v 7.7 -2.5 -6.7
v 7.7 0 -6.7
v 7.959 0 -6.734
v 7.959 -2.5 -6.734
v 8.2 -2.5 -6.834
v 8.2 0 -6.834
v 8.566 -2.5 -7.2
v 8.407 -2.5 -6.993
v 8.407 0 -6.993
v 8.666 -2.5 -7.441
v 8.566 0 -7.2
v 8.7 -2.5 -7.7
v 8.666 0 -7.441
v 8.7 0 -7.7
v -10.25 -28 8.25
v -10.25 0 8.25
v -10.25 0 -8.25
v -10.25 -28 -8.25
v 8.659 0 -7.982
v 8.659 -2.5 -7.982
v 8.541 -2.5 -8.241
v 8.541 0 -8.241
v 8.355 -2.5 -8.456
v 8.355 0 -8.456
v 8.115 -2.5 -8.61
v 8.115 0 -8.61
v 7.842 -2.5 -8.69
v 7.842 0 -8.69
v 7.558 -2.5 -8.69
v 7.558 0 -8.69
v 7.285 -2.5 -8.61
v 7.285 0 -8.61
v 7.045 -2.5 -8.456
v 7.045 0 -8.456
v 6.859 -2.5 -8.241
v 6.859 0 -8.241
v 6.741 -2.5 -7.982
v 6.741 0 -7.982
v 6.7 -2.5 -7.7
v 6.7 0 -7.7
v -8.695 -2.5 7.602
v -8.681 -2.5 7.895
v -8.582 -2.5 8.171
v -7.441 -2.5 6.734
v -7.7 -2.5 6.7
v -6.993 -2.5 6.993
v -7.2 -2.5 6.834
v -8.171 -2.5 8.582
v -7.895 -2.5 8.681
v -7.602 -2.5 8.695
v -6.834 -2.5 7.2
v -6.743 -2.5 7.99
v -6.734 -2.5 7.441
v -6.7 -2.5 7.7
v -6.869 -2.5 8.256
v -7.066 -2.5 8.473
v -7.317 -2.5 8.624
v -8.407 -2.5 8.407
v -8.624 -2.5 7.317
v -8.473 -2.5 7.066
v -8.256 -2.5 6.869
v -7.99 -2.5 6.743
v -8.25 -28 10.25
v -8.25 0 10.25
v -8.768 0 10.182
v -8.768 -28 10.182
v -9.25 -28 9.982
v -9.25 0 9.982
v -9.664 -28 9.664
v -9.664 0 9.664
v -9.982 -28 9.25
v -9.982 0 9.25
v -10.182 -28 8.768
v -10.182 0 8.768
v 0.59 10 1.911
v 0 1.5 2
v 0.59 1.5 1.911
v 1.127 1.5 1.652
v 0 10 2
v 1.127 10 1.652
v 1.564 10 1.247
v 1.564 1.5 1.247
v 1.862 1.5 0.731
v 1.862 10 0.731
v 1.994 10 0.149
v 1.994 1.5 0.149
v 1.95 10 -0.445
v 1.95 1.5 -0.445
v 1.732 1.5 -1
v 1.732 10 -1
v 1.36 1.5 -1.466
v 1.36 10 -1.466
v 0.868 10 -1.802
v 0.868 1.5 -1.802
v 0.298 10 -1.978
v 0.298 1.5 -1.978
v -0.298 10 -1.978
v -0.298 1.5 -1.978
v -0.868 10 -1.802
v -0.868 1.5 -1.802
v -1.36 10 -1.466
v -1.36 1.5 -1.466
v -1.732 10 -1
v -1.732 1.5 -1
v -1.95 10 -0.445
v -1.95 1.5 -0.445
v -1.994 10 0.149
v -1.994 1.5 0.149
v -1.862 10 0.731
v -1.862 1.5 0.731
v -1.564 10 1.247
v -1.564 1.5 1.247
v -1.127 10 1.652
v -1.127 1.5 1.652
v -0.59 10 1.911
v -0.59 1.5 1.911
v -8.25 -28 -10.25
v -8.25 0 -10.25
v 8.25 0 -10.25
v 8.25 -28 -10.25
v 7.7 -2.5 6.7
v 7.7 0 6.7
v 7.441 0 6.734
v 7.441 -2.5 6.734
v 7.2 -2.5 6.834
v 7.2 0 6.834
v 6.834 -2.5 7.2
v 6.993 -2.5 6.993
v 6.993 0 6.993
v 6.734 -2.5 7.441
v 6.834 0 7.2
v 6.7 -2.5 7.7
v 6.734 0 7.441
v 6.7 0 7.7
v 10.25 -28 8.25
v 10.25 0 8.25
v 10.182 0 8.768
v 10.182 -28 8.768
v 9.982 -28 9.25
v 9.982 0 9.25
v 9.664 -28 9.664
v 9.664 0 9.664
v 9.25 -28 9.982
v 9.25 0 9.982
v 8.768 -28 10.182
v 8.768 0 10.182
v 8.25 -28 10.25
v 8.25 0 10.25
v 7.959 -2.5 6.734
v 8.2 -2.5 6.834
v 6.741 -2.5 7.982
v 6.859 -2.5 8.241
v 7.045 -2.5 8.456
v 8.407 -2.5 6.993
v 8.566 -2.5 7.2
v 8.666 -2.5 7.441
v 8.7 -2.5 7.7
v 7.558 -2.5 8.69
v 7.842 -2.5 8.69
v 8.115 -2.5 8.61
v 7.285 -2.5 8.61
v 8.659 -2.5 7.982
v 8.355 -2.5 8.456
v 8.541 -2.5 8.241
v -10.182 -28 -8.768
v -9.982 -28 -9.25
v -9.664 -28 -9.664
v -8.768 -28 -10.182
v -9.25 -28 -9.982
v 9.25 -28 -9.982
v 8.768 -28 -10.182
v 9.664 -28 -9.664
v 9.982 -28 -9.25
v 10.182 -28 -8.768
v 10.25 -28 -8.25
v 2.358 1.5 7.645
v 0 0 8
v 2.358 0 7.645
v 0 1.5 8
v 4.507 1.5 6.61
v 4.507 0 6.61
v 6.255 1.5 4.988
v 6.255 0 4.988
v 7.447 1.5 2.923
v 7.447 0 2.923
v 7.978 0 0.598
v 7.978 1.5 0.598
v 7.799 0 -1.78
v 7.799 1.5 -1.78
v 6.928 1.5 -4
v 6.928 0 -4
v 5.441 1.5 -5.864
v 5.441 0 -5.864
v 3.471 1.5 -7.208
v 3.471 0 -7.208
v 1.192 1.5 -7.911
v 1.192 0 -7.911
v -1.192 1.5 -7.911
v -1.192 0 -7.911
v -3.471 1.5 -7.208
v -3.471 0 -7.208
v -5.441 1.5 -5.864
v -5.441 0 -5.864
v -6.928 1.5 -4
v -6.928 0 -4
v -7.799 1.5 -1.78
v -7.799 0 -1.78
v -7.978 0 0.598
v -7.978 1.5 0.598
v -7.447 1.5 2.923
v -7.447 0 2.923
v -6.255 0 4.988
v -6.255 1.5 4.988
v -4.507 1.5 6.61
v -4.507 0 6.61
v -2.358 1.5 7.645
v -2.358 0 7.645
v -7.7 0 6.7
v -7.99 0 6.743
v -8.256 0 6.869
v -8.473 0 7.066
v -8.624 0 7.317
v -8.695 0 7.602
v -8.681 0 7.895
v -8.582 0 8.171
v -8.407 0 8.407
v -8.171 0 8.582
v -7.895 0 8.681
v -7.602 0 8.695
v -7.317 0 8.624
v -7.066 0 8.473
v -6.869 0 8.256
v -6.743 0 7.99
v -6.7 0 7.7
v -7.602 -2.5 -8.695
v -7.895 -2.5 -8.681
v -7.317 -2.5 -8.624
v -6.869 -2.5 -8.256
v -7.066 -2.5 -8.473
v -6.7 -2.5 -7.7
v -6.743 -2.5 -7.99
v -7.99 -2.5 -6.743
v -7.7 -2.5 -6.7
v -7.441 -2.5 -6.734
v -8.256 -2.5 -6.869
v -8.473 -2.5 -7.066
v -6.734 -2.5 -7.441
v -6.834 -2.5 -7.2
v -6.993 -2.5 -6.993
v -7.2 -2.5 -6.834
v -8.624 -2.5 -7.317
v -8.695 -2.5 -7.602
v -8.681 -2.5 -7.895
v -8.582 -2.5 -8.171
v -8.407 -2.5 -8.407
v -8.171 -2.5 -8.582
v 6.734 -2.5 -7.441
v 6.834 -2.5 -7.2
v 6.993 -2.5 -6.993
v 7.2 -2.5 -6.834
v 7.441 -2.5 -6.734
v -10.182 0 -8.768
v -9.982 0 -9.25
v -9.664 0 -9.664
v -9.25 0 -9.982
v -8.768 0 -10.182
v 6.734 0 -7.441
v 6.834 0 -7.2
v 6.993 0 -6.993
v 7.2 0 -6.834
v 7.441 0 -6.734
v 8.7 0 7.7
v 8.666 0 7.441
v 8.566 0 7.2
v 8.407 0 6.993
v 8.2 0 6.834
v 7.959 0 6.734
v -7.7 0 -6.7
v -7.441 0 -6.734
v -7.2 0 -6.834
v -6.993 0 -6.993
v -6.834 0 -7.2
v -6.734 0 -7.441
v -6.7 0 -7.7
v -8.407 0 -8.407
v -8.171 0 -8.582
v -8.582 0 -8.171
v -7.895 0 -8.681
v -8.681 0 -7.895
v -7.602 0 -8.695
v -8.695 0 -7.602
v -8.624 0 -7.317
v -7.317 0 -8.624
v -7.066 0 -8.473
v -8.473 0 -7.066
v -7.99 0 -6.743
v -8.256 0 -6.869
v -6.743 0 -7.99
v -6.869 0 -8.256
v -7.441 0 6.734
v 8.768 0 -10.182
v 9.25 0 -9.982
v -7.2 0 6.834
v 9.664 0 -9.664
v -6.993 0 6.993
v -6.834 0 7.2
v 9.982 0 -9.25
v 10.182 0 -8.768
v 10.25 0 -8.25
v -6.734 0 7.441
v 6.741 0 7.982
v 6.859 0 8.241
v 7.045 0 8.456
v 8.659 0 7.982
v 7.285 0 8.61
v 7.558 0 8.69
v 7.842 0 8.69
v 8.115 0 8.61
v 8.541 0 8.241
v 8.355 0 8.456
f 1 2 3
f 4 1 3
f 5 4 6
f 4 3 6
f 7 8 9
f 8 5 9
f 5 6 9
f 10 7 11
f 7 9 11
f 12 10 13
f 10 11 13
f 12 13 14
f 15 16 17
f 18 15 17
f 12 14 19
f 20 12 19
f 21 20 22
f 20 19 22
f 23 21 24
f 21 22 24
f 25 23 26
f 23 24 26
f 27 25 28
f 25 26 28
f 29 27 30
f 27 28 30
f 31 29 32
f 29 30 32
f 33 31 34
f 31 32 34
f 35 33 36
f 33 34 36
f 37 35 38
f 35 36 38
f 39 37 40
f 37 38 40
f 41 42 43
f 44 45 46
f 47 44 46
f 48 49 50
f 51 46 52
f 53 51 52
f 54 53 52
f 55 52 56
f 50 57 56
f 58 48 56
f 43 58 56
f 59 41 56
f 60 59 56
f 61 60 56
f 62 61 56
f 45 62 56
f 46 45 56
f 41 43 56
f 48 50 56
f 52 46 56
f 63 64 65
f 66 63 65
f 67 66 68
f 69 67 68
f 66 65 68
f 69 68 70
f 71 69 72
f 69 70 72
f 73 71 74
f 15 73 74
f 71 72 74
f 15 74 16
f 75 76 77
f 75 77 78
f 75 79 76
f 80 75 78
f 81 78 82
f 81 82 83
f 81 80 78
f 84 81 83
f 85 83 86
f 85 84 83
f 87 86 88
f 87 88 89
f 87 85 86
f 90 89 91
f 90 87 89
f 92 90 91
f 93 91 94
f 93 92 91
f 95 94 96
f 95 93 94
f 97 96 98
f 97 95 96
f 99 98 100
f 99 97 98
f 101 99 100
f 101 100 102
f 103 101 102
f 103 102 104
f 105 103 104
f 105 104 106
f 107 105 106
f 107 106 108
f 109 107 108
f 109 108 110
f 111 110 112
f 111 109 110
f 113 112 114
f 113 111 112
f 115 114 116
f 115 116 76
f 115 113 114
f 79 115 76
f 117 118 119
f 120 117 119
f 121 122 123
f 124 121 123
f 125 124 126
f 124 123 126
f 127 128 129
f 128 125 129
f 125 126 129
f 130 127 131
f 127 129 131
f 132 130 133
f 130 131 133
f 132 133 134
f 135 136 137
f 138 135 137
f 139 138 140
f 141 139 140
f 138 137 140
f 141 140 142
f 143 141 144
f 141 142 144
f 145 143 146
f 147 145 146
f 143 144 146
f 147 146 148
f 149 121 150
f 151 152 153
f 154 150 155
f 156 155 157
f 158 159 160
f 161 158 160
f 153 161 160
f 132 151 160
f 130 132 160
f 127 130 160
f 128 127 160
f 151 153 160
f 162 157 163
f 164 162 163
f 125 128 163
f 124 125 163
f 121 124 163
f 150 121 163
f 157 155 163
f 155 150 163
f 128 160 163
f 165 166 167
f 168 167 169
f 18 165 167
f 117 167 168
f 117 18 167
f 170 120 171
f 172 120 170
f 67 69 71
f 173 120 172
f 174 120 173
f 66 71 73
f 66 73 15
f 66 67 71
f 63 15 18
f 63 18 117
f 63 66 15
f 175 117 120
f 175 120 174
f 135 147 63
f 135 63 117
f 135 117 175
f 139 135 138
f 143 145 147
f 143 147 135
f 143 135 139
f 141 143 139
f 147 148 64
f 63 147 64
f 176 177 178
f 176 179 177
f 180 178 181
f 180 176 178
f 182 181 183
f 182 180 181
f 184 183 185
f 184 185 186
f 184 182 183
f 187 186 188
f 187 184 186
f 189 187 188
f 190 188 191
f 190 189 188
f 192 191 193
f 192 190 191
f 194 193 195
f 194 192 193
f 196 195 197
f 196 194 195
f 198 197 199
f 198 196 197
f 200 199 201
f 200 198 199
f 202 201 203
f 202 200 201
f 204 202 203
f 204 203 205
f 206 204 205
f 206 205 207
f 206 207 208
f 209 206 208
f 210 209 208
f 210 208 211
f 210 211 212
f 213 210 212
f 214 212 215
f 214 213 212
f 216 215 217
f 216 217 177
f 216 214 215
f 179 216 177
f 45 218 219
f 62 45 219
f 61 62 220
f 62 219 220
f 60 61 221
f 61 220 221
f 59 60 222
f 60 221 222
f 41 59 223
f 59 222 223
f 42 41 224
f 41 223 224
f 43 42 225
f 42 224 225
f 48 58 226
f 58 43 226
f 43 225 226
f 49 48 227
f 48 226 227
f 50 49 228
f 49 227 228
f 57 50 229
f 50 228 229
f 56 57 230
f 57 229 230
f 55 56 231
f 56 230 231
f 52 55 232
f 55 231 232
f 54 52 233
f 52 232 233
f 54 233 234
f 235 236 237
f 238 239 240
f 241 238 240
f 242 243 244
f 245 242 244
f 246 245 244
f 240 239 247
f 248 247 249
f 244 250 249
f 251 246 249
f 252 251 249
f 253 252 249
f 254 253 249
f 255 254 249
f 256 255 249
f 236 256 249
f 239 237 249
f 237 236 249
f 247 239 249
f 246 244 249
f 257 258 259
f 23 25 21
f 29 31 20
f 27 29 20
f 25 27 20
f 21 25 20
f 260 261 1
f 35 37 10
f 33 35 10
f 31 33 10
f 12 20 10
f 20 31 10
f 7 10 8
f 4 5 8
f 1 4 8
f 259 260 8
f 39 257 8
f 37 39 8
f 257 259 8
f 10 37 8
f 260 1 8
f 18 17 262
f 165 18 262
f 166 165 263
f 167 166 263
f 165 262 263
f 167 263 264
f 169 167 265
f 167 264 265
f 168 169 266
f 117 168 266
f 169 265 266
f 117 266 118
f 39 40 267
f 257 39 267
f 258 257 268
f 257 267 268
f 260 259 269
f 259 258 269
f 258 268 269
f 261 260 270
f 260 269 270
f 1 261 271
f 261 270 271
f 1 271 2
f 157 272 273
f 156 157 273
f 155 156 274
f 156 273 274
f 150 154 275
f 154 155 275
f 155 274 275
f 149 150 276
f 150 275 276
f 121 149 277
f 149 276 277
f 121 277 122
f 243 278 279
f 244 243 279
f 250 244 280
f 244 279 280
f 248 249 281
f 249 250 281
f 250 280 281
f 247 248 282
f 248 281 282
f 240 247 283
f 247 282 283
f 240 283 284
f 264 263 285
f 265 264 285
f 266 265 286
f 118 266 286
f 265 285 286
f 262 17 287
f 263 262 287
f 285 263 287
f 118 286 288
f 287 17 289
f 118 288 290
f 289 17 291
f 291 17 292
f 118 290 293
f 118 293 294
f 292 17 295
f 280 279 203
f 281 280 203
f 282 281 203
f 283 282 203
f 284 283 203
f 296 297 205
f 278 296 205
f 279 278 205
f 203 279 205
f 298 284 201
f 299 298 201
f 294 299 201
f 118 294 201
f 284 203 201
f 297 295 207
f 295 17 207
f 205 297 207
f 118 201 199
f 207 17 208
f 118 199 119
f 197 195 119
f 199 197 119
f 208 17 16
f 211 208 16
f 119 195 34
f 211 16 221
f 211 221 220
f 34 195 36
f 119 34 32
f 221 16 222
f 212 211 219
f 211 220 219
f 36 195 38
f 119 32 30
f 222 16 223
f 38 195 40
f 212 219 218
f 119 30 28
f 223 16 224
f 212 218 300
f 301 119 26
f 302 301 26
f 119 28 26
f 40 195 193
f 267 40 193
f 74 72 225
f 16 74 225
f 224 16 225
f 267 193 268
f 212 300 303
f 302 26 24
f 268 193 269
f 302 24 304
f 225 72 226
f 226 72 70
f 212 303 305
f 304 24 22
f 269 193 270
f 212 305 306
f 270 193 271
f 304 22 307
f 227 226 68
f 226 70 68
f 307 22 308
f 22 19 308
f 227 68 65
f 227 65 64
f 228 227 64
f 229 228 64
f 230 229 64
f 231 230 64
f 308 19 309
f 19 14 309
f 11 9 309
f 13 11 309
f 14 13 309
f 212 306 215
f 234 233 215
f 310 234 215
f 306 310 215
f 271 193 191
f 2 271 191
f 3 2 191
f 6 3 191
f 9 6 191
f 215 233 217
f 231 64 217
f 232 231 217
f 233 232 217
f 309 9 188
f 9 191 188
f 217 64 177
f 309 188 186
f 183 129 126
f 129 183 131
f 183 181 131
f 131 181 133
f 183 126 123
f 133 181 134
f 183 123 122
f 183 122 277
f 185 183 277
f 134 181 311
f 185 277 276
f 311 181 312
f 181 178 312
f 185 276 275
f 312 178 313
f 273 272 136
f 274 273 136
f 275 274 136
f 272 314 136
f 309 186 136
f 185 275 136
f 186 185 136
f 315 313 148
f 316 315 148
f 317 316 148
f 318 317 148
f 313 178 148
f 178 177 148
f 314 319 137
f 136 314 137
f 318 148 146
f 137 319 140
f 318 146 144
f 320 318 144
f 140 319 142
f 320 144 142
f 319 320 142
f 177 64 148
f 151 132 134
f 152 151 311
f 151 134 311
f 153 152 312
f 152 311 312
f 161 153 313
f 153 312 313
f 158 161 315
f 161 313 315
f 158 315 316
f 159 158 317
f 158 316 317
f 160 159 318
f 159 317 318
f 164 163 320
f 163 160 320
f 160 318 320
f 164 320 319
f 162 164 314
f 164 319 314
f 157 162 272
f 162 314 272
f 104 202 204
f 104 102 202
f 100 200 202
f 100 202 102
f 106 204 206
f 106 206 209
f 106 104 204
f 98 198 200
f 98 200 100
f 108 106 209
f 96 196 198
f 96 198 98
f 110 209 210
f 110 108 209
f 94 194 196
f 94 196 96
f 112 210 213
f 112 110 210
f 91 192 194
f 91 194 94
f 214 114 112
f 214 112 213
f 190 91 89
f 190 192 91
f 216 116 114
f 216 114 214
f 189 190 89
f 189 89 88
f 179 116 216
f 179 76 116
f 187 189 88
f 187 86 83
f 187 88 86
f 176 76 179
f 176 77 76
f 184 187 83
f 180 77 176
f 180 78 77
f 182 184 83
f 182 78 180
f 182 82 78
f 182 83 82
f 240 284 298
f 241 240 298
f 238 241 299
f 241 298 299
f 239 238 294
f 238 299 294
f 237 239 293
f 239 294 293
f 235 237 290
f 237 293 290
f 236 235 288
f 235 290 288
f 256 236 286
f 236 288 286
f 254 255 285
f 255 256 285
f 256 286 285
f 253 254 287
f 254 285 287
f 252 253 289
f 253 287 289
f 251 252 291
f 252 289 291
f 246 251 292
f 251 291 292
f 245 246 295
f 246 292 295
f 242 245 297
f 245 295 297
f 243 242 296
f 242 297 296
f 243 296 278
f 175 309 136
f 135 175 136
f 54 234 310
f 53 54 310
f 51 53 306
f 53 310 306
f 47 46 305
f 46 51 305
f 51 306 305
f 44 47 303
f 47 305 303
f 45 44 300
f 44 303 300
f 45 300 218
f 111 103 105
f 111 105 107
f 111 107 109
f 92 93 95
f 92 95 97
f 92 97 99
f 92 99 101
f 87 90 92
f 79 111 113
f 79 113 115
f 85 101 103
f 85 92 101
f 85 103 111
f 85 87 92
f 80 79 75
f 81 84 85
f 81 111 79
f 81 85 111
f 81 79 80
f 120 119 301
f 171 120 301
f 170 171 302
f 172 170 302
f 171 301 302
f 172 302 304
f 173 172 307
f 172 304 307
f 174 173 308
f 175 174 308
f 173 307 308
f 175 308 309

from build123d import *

# Parameters (mm, degrees)
F1_DEPTH = 28
F2_R     = 1
F3_DEPTH = 25.5


with BuildPart() as f1:
    # F0 (on Front) → F1 (new body)
    with BuildSketch(Plane.XZ):
        with BuildLine():
            Line((8.25, 10.25), (-8.25, 10.25))
            ThreePointArc((-8.25, 10.25), (-9.6642135624, 9.6642135624), (-10.25, 8.25))
            Line((-10.25, 8.25), (-10.25, -8.25))
            ThreePointArc((-10.25, -8.25), (-9.6642135624, -9.6642135624), (-8.25, -10.25))
            Line((-8.25, -10.25), (8.25, -10.25))
            ThreePointArc((8.25, -10.25), (9.6642135624, -9.6642135624), (10.25, -8.25))
            Line((10.25, -8.25), (10.25, 8.25))
            ThreePointArc((10.25, 8.25), (9.6642135624, 9.6642135624), (8.25, 10.25))
        make_face()
        with BuildLine():
            ThreePointArc((-7.7, 6.7), (-8.4071067812, 8.4071067812), (-6.7, 7.7))
            Line((-6.7, 7.7), (6.7, 7.7))
            ThreePointArc((6.7, 7.7), (7.7, 8.7), (8.7, 7.7))
            ThreePointArc((8.7, 7.7), (8.4071067812, 6.9928932188), (7.7, 6.7))
            Line((7.7, 6.7), (7.7, -6.7))
            ThreePointArc((7.7, -6.7), (8.4071067812, -6.9928932188), (8.7, -7.7))
            ThreePointArc((8.7, -7.7), (7.7, -8.7), (6.7, -7.7))
            Line((6.7, -7.7), (-6.7, -7.7))
            ThreePointArc((-6.7, -7.7), (-8.4071067812, -8.4071067812), (-7.7, -6.7))
            Line((-7.7, -6.7), (-7.7, 6.7))
        make_face(mode=Mode.SUBTRACT)
        with BuildLine():
            Line((6.7, 7.7), (-6.7, 7.7))
            ThreePointArc((-6.7, 7.7), (-6.9928932188, 6.9928932188), (-7.7, 6.7))
            Line((-7.7, 6.7), (-7.7, -6.7))
            ThreePointArc((-7.7, -6.7), (-6.9928932188, -6.9928932188), (-6.7, -7.7))
            Line((-6.7, -7.7), (6.7, -7.7))
            ThreePointArc((6.7, -7.7), (6.9928932188, -6.9928932188), (7.7, -6.7))
            Line((7.7, -6.7), (7.7, 6.7))
            ThreePointArc((7.7, 6.7), (6.9928932188, 6.9928932188), (6.7, 7.7))
        make_face()
    extrude(amount=F1_DEPTH)

    # F2 (on face) → F3 (join)
    with BuildSketch(Plane.XZ.offset(28)):
        with Locations((-7.7, 7.7)):
            Circle(F2_R)
        with Locations((7.7, 7.7)):
            Circle(F2_R)
        with Locations((7.7, -7.7)):
            Circle(F2_R)
        with Locations((-7.7, -7.7)):
            Circle(F2_R)
    extrude(amount=-F3_DEPTH)

    # F5 (on offset) → F6 (revolve)
    with BuildSketch(Plane(origin=(0, 0, 0), x_dir=(0, -1, 0), z_dir=(-1, 0, 0))):
        Polygon((-10, 0), (0, 0), (0, 8), (-1.5, 8), (-1.5, 2), (-10, 2), align=None)
    revolve(axis=Axis((0, 5, 0), (0, 1, 0)))


solid = f1.part
